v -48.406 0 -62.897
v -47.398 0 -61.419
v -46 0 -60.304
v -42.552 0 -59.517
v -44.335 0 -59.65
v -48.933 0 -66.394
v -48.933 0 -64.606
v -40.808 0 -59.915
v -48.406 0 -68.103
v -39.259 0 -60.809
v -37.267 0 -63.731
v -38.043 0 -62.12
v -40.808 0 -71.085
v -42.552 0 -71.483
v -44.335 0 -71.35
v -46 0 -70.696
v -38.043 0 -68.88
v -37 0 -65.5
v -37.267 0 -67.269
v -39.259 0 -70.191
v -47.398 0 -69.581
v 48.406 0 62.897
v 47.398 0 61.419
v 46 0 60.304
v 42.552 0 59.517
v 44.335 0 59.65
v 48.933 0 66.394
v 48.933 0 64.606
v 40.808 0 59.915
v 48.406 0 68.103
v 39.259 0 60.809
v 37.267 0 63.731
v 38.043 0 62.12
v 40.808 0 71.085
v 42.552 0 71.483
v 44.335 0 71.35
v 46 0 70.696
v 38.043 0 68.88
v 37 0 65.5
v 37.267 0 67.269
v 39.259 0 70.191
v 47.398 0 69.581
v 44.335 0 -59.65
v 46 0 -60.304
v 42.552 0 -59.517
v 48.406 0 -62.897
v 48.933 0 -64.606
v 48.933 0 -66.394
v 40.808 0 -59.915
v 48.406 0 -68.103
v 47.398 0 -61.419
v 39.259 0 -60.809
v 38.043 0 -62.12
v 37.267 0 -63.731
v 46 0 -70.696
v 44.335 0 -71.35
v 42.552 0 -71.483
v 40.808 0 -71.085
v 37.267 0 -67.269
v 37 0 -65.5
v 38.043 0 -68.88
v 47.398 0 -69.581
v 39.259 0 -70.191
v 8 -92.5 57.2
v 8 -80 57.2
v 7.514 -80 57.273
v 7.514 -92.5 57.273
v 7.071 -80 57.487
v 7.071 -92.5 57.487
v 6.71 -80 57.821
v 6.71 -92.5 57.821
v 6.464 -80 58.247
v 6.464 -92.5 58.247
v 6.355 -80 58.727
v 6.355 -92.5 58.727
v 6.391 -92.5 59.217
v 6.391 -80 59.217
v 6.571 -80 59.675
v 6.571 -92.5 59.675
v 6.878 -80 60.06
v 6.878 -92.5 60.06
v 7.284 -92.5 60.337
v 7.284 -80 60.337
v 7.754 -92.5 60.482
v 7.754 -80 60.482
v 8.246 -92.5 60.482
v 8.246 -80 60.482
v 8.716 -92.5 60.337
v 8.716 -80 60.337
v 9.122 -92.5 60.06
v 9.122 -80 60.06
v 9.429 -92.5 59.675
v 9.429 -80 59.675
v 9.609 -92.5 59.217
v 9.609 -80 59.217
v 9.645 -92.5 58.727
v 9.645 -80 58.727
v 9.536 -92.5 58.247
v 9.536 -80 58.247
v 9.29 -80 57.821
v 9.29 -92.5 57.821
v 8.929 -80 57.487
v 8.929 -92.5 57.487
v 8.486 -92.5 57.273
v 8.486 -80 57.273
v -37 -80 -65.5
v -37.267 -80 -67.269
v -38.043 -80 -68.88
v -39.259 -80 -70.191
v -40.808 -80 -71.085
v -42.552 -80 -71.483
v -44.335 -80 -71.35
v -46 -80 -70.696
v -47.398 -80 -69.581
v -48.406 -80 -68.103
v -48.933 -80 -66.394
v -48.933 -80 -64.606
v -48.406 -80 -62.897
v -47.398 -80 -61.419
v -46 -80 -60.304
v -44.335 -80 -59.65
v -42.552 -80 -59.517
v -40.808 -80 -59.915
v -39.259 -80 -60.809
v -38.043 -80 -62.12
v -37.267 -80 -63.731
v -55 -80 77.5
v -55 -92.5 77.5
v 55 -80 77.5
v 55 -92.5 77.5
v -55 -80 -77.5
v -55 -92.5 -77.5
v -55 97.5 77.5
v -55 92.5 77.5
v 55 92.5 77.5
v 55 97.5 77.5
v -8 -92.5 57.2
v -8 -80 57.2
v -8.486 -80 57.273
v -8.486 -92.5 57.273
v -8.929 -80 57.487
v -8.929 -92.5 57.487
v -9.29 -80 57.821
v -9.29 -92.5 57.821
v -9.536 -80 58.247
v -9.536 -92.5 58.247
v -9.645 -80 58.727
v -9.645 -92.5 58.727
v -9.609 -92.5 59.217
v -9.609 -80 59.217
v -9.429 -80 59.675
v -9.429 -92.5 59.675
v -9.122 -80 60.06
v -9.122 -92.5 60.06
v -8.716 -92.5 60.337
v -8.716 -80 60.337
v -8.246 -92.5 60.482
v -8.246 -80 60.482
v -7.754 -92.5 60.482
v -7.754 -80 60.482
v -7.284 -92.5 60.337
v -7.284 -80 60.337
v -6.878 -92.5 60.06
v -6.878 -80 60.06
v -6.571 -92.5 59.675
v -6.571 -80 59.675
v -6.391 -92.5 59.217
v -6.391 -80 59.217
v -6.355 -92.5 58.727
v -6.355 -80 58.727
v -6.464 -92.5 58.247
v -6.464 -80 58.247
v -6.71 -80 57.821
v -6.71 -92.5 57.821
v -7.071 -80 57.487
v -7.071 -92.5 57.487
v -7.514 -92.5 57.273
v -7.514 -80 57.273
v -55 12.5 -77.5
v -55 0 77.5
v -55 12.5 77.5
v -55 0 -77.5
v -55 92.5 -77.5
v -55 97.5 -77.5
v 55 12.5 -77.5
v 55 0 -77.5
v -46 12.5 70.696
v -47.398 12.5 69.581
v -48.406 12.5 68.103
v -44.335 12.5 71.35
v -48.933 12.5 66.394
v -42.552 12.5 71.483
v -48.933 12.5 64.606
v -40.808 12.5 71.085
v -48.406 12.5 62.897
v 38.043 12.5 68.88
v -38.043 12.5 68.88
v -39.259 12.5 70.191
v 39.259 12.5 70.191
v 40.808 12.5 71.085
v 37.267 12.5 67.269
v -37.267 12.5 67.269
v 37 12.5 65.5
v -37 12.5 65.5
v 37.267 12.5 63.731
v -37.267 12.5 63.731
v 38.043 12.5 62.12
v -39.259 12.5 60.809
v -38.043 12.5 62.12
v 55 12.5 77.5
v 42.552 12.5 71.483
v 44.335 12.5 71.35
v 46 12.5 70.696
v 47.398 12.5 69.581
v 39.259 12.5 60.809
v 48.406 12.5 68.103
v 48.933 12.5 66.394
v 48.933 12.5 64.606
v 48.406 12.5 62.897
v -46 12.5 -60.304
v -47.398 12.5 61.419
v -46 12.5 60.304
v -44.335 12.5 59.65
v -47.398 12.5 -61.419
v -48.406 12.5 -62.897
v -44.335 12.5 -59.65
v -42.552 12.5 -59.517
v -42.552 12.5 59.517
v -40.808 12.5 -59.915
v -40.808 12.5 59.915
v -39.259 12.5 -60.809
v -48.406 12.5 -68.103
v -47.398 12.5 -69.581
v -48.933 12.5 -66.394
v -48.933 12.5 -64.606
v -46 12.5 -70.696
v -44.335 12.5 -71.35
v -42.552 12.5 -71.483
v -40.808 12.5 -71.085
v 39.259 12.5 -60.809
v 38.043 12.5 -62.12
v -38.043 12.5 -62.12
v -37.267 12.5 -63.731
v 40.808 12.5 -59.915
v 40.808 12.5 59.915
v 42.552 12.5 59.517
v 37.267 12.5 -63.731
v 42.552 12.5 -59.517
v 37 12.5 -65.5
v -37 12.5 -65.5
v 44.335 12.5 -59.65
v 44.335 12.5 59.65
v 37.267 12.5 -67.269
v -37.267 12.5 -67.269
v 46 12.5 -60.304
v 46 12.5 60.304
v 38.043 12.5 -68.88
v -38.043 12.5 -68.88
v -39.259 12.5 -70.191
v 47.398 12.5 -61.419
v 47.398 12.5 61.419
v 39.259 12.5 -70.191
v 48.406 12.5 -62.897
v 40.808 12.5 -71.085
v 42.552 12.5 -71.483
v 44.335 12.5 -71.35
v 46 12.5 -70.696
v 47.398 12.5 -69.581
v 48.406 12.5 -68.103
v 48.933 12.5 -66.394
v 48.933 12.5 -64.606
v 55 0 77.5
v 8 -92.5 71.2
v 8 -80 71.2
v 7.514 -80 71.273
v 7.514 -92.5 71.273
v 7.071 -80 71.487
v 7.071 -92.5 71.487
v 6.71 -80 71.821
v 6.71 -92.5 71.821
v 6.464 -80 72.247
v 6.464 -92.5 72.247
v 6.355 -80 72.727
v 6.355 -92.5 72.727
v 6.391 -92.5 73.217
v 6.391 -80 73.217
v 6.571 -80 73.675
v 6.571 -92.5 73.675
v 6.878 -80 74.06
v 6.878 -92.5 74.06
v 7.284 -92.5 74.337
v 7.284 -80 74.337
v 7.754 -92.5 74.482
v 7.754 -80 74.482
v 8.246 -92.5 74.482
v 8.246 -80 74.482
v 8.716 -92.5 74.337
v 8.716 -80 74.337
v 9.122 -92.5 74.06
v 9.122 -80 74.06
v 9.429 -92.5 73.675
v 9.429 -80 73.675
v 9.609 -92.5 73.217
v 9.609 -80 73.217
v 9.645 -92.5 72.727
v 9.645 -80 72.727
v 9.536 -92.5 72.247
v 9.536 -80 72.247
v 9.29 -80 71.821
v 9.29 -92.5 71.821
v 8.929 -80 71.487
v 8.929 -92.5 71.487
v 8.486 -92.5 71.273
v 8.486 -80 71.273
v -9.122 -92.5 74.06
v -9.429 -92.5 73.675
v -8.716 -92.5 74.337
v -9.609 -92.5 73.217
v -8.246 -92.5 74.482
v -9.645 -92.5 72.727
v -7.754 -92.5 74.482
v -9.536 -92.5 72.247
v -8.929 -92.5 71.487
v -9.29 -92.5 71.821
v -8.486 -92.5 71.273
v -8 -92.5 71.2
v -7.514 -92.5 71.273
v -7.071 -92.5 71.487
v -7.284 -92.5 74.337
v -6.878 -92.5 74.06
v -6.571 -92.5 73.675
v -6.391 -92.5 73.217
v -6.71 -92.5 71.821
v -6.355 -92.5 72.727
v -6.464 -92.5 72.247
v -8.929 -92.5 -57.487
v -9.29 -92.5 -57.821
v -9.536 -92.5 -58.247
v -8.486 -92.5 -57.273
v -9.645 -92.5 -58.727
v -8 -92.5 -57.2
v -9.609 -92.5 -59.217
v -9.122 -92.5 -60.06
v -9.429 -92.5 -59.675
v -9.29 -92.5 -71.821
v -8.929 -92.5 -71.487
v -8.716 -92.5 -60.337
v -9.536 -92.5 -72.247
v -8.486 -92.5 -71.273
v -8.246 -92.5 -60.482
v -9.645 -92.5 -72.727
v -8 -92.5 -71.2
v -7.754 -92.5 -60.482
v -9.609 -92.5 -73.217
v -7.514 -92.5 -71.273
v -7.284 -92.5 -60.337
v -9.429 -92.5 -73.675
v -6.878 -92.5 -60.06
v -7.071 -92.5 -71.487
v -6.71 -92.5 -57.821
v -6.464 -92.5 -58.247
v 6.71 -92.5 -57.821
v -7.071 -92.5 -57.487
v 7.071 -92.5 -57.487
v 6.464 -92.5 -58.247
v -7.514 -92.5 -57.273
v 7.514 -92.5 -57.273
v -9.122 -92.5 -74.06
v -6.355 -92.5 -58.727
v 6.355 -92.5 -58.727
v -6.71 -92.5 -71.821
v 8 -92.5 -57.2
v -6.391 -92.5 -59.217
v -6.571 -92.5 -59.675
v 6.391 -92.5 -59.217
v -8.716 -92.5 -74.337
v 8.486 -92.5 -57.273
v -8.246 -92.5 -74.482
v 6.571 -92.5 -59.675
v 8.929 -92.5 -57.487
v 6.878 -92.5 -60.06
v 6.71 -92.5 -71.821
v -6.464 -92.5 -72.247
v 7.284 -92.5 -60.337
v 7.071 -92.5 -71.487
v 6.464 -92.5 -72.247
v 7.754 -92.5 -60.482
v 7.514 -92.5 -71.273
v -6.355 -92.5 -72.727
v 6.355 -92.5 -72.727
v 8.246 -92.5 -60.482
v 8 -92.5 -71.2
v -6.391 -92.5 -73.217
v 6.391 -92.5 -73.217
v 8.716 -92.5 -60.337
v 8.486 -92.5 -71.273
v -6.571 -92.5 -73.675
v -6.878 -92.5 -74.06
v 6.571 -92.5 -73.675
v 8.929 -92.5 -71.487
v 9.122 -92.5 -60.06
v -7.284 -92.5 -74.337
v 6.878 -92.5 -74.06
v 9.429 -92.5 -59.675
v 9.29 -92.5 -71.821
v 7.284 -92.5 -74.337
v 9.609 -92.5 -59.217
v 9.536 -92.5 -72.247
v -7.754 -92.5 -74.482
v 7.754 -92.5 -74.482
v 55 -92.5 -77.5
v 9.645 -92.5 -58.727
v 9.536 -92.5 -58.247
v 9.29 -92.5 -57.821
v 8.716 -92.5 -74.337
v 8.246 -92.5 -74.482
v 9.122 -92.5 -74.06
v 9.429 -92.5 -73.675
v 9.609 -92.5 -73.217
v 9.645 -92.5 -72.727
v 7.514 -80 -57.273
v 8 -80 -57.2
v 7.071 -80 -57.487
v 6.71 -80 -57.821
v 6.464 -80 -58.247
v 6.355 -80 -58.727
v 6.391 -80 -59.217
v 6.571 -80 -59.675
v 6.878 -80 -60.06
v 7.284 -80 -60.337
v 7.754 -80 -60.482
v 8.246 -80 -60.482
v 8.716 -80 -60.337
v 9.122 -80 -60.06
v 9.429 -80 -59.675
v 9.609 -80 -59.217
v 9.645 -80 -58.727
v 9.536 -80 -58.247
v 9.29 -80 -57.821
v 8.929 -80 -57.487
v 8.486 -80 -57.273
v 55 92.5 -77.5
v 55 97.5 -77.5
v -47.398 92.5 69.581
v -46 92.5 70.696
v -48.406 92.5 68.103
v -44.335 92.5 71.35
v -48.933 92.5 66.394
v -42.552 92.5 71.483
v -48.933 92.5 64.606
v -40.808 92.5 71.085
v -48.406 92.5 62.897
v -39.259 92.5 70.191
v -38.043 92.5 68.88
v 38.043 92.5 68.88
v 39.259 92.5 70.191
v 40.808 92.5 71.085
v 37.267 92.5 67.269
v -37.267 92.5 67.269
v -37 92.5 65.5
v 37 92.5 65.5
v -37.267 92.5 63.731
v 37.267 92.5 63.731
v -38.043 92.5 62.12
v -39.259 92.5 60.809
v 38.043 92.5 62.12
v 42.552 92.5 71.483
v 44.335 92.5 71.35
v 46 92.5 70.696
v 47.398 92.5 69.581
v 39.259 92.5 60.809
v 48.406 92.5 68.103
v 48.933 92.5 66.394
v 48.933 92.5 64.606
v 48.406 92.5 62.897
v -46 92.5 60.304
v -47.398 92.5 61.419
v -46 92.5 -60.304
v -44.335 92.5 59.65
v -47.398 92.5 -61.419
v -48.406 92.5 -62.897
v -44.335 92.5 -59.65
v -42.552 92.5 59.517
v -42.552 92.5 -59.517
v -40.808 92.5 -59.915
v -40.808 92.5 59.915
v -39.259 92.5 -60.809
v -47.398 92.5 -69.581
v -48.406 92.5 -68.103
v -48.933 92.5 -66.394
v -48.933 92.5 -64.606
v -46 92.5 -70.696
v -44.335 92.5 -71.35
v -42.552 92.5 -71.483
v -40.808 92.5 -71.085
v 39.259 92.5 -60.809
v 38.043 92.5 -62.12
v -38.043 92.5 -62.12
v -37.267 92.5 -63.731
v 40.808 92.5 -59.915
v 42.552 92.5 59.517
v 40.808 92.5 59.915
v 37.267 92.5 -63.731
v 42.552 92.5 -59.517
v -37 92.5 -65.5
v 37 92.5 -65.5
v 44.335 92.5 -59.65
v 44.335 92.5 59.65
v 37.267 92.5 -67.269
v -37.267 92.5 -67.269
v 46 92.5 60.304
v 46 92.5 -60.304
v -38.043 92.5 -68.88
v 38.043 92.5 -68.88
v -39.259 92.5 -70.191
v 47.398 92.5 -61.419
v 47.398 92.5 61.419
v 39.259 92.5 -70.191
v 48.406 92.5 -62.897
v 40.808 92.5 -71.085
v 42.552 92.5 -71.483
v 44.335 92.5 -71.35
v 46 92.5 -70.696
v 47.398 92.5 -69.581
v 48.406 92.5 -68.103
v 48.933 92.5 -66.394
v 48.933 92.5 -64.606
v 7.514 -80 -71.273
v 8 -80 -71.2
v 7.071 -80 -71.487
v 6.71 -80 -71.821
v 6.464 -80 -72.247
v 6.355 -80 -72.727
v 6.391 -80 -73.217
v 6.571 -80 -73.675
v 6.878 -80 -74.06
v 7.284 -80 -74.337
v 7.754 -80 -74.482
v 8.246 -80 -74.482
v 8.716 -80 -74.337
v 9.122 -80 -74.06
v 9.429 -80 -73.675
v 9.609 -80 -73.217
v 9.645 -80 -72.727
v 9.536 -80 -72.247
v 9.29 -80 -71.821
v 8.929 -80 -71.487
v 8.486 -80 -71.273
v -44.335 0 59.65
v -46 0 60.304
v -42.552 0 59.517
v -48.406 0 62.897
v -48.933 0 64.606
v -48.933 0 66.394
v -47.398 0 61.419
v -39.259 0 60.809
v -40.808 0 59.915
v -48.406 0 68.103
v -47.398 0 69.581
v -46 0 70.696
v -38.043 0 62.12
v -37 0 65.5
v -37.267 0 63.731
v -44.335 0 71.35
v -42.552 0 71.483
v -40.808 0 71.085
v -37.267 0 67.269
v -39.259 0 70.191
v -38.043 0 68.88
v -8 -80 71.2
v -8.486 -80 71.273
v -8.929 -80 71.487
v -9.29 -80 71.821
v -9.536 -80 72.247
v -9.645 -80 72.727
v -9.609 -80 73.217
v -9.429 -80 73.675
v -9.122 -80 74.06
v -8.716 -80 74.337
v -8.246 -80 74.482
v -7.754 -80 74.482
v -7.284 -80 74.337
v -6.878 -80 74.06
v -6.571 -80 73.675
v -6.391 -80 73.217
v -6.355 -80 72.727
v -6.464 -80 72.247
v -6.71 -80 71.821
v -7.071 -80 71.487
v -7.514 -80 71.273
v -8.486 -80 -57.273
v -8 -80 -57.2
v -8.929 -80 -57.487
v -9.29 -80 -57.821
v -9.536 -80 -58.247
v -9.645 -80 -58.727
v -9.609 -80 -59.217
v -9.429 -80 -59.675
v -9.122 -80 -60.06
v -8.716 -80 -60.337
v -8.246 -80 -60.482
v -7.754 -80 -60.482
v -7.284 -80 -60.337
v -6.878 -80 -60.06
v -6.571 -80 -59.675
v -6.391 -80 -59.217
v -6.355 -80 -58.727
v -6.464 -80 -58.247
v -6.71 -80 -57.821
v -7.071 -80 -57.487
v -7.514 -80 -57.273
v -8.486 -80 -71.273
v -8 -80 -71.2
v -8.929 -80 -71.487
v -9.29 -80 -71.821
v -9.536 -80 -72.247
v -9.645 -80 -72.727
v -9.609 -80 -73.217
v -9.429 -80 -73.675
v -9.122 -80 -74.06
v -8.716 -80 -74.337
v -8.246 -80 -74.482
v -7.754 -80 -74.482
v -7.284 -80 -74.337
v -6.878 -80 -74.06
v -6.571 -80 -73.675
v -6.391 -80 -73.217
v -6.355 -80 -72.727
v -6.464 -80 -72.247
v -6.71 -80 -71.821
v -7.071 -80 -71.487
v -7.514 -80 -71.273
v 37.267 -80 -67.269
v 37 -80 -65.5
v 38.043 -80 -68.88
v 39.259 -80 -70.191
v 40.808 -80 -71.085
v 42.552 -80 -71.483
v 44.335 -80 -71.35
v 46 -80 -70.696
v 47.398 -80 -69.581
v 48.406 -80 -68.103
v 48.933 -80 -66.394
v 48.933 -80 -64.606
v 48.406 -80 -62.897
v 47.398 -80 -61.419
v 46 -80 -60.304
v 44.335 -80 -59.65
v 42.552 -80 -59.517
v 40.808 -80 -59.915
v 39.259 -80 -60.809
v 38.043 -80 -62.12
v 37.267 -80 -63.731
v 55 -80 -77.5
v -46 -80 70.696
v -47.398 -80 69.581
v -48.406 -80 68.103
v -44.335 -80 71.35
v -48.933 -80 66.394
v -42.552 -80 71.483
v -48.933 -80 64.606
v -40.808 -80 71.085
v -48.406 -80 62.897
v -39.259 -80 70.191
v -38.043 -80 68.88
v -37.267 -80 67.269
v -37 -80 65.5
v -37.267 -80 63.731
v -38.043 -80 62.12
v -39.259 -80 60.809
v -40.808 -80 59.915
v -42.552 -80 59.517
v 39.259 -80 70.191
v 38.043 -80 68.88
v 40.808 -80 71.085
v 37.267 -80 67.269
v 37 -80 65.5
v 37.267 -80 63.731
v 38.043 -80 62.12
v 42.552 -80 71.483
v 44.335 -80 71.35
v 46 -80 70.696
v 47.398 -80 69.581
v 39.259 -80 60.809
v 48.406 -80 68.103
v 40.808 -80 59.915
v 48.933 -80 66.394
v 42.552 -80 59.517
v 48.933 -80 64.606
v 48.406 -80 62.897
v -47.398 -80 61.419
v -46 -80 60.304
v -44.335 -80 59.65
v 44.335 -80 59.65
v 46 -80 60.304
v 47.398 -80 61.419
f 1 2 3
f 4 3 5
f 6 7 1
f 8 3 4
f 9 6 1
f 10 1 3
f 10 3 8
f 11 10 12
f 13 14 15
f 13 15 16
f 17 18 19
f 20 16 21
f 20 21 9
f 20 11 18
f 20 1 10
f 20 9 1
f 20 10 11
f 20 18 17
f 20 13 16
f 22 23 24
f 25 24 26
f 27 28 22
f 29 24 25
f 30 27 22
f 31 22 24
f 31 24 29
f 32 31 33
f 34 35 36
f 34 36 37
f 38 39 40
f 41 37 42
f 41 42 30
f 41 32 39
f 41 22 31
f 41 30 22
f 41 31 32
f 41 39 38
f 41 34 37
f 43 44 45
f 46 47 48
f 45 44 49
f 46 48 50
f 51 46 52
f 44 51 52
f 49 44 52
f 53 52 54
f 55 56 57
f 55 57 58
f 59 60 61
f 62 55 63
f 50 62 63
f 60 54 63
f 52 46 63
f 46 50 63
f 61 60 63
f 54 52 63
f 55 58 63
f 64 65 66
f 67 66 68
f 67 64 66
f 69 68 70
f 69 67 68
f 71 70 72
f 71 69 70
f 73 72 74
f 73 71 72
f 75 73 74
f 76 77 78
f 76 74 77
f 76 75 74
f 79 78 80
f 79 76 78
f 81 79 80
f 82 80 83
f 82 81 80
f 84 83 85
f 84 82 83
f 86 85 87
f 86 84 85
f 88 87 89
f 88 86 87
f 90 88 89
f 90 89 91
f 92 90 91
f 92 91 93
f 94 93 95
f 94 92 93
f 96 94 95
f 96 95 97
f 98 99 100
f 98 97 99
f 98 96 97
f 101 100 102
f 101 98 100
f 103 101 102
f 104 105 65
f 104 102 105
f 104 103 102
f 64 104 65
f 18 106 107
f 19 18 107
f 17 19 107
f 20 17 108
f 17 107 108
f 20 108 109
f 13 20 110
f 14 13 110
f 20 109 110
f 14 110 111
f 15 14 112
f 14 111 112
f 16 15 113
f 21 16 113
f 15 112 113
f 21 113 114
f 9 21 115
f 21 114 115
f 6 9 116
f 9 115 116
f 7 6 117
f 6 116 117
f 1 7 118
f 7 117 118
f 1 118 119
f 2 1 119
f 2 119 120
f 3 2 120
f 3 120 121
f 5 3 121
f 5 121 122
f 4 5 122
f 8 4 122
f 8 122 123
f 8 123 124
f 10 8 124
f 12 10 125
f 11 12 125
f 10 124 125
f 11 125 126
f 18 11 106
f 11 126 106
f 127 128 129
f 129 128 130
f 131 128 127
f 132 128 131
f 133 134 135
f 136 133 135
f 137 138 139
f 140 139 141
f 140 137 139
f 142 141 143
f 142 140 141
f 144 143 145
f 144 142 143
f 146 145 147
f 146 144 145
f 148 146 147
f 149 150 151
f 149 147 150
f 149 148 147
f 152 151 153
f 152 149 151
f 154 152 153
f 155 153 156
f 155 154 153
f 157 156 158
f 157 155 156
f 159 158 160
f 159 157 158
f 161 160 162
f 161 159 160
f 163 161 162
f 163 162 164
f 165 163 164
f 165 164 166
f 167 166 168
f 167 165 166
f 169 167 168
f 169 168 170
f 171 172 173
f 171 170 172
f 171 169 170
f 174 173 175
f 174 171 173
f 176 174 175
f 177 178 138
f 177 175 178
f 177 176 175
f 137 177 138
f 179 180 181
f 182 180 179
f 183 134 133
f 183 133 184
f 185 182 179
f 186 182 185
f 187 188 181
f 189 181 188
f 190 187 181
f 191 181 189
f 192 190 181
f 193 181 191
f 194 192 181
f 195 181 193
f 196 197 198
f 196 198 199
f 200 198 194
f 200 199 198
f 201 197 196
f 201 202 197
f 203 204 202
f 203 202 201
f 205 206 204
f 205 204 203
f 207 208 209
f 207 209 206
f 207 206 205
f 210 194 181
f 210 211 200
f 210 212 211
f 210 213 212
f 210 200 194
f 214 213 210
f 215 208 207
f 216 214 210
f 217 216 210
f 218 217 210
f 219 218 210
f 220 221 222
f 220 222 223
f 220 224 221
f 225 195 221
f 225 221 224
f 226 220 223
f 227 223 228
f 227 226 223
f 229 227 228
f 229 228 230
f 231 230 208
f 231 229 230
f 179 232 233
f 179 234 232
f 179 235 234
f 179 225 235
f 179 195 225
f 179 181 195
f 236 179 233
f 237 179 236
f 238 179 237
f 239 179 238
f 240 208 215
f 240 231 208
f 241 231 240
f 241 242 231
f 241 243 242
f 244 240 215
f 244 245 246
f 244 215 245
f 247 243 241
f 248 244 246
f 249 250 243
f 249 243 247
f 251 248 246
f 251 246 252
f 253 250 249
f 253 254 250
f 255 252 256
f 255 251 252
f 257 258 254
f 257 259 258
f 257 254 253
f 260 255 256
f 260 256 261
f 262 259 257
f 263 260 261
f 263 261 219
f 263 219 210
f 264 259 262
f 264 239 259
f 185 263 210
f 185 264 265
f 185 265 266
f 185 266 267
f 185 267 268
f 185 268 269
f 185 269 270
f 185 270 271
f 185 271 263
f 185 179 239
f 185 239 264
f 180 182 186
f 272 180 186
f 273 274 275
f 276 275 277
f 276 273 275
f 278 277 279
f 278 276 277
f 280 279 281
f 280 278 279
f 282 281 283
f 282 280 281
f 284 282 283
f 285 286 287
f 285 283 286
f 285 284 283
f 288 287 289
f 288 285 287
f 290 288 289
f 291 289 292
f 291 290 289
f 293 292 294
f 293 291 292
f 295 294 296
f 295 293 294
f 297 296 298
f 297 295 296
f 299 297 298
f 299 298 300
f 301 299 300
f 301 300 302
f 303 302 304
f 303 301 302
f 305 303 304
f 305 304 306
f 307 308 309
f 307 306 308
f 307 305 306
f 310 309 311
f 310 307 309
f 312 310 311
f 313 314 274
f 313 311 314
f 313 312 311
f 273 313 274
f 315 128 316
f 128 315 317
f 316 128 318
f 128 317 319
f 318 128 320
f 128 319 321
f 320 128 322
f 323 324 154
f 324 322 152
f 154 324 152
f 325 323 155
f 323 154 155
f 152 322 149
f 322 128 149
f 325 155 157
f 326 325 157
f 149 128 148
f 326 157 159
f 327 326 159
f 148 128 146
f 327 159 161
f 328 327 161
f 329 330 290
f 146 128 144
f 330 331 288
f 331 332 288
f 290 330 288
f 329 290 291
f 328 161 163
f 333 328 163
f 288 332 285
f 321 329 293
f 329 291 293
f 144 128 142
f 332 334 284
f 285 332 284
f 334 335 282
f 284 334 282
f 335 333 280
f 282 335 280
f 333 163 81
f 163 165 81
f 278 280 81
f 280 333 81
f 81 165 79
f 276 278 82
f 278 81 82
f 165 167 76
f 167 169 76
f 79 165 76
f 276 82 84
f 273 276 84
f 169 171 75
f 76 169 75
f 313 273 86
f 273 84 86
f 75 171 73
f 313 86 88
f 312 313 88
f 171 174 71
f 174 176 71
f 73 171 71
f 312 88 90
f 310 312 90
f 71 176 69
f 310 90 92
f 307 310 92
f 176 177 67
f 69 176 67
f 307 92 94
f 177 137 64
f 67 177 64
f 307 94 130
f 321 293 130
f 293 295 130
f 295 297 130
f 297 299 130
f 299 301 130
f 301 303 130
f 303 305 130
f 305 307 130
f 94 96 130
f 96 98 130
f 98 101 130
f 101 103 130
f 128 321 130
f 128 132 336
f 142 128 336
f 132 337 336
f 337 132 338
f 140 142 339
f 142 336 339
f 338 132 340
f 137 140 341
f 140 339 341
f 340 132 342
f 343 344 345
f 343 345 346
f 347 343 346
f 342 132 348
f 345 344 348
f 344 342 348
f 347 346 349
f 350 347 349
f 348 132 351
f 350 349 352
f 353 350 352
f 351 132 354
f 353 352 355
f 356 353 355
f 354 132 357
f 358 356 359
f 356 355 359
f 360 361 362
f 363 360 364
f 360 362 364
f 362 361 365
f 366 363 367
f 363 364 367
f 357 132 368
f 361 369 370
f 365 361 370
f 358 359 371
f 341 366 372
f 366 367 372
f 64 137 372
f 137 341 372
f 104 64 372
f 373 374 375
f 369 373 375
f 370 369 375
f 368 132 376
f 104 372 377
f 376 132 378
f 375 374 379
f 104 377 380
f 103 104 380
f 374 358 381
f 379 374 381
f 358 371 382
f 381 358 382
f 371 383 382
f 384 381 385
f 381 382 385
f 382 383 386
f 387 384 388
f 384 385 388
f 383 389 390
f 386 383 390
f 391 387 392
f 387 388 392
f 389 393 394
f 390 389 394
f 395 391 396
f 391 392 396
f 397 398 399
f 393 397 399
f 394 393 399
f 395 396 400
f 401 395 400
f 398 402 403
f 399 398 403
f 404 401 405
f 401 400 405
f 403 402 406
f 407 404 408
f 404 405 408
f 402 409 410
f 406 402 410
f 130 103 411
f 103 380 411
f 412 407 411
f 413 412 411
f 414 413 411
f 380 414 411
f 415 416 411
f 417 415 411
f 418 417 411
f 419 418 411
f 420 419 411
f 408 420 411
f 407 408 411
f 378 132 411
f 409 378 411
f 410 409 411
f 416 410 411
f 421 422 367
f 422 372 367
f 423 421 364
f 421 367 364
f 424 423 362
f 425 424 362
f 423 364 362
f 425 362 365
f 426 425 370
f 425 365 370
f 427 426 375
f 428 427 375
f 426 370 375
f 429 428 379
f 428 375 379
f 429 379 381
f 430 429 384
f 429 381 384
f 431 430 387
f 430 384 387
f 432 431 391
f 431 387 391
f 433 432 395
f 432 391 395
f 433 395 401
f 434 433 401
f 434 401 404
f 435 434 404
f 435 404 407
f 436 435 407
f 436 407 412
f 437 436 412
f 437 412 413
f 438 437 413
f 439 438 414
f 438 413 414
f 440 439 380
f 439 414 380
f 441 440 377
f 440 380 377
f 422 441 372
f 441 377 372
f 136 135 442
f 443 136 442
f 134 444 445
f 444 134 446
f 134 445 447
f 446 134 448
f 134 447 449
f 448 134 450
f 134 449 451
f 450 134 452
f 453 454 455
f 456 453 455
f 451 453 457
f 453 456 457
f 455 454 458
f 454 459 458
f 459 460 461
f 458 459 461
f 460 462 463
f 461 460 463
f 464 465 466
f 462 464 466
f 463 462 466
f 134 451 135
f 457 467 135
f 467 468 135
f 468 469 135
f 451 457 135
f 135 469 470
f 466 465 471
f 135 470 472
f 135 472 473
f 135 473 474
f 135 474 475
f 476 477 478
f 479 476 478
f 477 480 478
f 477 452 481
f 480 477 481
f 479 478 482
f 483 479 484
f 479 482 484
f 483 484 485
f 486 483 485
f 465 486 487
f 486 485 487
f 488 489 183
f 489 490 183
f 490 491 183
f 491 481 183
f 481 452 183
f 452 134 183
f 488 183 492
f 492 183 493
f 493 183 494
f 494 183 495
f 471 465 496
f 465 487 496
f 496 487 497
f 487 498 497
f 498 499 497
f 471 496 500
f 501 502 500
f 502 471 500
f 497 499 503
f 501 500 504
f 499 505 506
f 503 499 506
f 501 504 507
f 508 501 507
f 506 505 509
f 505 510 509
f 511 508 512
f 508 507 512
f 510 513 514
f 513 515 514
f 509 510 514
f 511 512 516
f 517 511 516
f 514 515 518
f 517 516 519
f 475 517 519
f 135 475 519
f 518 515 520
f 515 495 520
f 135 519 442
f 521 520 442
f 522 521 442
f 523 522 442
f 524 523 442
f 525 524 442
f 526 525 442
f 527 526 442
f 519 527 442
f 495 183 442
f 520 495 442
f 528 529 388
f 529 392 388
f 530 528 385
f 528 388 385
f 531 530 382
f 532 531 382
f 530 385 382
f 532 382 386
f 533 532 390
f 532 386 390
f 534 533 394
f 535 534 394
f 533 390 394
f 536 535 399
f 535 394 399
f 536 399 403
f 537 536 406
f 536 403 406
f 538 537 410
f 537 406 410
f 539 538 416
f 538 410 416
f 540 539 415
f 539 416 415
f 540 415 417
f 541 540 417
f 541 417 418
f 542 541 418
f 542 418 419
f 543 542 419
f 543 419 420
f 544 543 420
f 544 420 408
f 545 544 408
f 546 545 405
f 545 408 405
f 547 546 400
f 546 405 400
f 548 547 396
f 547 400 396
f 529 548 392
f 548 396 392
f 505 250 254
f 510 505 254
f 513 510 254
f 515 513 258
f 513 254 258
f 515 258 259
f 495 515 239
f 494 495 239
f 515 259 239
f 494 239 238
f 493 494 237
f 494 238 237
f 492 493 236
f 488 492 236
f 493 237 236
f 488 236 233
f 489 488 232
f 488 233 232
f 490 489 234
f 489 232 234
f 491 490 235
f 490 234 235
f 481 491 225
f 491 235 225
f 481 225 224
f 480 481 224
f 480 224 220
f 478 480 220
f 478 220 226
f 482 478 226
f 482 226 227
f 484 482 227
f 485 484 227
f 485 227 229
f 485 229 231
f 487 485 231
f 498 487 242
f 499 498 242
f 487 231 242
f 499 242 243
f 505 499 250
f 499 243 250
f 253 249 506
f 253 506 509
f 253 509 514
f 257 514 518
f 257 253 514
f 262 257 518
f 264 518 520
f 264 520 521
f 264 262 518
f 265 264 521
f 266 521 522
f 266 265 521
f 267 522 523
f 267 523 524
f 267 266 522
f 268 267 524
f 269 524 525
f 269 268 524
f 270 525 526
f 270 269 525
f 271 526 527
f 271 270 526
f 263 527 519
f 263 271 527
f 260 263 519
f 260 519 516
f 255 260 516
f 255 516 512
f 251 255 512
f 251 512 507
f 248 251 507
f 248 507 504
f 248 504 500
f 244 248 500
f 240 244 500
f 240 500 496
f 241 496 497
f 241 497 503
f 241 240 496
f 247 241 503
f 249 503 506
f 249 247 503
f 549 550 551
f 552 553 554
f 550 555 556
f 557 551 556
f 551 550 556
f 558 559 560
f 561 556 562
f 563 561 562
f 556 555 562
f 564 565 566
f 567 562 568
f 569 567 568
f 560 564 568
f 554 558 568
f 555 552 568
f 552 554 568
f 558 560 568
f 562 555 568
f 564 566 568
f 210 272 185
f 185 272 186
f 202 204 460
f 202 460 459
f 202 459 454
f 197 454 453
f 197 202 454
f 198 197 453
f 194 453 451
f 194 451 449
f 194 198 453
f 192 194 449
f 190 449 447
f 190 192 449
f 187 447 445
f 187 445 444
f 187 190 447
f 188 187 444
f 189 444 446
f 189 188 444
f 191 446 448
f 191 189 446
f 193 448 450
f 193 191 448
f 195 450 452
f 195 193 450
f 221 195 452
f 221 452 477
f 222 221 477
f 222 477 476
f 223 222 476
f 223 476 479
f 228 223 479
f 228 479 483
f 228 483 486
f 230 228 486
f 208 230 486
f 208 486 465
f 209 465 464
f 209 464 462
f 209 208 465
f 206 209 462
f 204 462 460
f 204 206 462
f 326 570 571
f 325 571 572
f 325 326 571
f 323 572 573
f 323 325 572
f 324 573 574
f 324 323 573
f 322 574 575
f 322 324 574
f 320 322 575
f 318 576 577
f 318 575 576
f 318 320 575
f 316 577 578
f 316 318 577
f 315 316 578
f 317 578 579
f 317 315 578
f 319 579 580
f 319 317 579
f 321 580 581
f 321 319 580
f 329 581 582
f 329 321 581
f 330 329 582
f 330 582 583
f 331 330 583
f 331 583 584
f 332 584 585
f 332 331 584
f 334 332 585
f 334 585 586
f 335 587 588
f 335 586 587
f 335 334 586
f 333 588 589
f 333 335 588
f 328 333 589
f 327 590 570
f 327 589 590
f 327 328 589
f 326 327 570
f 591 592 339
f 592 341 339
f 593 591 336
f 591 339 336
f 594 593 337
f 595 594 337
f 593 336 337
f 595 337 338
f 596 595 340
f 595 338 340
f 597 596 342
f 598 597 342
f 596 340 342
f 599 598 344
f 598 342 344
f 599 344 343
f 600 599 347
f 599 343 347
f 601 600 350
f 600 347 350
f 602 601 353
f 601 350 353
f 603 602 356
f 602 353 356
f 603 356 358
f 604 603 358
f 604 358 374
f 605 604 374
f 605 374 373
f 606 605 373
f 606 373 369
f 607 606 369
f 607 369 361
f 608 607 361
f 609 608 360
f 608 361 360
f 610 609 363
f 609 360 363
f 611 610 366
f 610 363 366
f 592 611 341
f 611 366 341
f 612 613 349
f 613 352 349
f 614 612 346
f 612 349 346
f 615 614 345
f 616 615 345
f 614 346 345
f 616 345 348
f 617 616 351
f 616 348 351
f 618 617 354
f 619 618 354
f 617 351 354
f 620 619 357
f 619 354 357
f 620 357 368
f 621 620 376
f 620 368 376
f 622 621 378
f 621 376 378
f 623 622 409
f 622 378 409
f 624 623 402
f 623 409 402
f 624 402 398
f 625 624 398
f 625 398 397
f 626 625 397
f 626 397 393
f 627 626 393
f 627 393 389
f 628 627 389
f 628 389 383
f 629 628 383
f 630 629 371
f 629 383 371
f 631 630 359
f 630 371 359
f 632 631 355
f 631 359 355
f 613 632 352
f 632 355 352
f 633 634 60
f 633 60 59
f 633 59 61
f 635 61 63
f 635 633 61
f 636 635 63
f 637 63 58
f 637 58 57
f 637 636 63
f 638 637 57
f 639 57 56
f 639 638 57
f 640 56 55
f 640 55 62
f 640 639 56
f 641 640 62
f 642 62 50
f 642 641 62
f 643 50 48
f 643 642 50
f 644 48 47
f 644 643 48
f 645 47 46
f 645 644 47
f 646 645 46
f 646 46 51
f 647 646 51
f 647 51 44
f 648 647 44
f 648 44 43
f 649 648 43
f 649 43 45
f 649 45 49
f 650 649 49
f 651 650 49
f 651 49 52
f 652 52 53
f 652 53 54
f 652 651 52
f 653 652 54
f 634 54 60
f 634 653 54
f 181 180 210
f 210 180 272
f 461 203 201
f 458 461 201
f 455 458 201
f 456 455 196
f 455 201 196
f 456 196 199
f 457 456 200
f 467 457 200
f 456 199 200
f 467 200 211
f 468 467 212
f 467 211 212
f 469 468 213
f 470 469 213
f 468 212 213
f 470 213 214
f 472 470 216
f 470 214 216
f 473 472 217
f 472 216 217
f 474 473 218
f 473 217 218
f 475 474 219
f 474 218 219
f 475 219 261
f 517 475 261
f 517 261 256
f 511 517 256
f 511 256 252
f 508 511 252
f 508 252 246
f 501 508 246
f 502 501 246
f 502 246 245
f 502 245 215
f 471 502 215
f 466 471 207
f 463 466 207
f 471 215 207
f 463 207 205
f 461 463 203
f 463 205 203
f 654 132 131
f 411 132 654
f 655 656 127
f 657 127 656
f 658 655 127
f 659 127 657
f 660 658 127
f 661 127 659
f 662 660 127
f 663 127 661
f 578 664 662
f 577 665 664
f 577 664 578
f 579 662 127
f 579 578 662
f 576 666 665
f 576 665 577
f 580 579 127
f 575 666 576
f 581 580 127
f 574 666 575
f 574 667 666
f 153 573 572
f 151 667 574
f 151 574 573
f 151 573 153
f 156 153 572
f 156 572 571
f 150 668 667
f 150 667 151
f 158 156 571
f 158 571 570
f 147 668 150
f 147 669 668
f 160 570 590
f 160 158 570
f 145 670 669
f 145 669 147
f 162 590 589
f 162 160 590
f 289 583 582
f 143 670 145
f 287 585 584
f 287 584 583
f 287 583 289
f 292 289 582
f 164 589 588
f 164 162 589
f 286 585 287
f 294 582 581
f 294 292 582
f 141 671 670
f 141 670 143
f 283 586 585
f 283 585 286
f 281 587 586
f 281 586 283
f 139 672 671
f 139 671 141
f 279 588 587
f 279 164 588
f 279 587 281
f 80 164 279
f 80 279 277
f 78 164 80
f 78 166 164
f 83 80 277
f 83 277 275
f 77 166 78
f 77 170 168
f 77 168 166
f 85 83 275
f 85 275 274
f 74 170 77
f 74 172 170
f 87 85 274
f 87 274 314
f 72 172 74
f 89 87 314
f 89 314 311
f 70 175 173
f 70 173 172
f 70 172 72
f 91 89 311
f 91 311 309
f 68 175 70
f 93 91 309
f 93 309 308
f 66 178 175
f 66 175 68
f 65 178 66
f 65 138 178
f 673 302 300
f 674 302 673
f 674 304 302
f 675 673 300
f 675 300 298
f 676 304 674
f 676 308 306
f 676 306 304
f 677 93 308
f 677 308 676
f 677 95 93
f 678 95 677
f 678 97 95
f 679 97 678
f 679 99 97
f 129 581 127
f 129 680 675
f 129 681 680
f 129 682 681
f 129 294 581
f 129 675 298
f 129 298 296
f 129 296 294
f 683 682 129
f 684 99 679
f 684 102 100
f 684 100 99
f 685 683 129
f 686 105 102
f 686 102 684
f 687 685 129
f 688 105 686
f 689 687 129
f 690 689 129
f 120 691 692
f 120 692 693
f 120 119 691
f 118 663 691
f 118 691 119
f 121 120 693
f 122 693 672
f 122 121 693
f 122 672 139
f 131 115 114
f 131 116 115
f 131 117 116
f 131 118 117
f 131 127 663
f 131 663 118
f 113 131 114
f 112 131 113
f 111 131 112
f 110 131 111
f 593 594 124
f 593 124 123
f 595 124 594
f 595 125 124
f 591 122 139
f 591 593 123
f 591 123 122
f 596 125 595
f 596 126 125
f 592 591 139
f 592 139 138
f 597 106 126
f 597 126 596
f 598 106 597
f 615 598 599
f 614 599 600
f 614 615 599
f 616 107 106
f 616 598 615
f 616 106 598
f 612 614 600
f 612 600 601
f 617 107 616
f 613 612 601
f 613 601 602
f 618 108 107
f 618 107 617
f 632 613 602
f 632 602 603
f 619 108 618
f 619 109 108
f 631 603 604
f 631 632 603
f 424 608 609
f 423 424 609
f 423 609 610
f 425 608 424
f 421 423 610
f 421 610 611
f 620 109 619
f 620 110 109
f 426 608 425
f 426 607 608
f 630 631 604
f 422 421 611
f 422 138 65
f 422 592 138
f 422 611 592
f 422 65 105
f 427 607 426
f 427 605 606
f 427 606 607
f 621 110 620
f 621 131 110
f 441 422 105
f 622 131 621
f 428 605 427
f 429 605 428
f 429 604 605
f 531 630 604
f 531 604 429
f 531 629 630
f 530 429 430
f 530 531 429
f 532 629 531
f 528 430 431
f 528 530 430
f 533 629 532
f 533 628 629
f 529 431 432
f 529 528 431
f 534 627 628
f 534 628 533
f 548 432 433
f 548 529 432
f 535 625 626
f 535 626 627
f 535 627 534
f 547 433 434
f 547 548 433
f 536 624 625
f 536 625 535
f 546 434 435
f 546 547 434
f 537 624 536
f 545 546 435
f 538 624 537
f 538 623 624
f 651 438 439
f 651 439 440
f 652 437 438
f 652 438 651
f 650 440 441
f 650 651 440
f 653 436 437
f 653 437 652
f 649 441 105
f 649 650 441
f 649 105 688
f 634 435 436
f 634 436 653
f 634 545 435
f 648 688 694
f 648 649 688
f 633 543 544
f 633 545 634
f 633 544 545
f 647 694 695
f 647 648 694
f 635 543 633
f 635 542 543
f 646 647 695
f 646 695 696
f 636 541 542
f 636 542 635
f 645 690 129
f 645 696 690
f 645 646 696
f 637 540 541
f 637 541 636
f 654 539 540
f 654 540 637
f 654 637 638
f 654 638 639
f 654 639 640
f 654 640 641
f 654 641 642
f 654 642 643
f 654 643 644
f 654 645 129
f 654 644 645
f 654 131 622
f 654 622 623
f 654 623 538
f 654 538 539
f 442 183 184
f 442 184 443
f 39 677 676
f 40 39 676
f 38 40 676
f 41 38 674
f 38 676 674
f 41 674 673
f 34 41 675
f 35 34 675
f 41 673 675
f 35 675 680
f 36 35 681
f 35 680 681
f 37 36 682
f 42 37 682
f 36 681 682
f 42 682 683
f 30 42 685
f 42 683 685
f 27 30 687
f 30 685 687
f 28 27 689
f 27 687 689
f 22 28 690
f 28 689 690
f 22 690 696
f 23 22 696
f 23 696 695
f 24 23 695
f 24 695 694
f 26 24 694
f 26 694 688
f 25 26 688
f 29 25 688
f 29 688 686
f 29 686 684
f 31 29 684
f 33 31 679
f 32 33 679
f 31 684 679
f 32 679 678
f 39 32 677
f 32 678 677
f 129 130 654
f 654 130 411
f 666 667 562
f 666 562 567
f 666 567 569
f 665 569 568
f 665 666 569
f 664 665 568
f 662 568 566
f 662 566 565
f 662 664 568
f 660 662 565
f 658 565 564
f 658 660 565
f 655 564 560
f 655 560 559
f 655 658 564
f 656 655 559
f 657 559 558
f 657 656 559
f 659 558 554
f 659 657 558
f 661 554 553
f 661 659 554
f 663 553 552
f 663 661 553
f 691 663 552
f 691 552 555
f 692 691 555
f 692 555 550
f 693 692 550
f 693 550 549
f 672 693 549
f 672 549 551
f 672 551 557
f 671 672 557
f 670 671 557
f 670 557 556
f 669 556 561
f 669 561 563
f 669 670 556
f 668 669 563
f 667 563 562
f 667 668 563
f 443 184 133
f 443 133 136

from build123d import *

# Parameters (mm, degrees)
SKETCH1_W                           = 110
SKETCH1_H                           = 155
BOSS_EXTRUDE1_DEPTH                 = 12.5
SKETCH2_R                           = 6
BOSS_EXTRUDE2_DEPTH                 = 80
MIRROR2_COPY_1_SKETCH_R             = 6
MIRROR2_COPY_1_DEPTH                = 80
LPATTERN1_COUNT                     = 2
LPATTERN1_PITCH                     = 92.5
F_3_3_3_3_DIAMETER_HOLE1_AT_2_COUNT = 2
F_3_3_3_3_DIAMETER_HOLE1_AT_2_PITCH = 16
LPATTERN3_COUNT                     = 2
LPATTERN3_PITCH                     = 14
SKETCH7_W                           = 110
SKETCH7_H                           = 155
BOSS_EXTRUDE3_DEPTH                 = 5


with BuildPart() as part:
    # Sketch1 → Boss-Extrude1 (new body)
    with BuildSketch(Plane(origin=(0, 0, 0), x_dir=(1, 0, 0), z_dir=(0, 1, 0))):
        Rectangle(SKETCH1_W, SKETCH1_H)
    extrude(amount=BOSS_EXTRUDE1_DEPTH)

    # Sketch2 → Boss-Extrude2 (add)
    with BuildSketch(Plane(origin=(0, 12.5, 0), x_dir=(1, 0, 0), z_dir=(0, 1, 0))):
        with Locations((-43, 65.5)):
            Circle(SKETCH2_R)
    boss_extrude2 = extrude(amount=BOSS_EXTRUDE2_DEPTH)

    # Mirror1: Boss-Extrude2 across plane
    add(boss_extrude2.mirror(Plane.XY))

    # Mirror2: Boss-Extrude2 across plane
    add(boss_extrude2.mirror(Plane(origin=(0, 0, 0), x_dir=(0, 0, 1), z_dir=(1, 0, 0))))

    # Mirror2 copy 1 sketch → Mirror2 copy 1 (add)
    with BuildSketch(Plane(origin=(0, 12.5, 0), x_dir=(-1, 0, 0), z_dir=(0, 1, 0))):
        with Locations((-43, 65.5)):
            Circle(MIRROR2_COPY_1_SKETCH_R)
    extrude(amount=MIRROR2_COPY_1_DEPTH)


with BuildPart() as lpattern1_1:
    # LPattern1: pattern copy
    add(part.part.moved(Location(Vector(0, -1, 0) * (1 * LPATTERN1_PITCH))))

    # Sketch6 → Ø3.3 (3.3) Diameter Hole1 (revolve, cut)
    with BuildSketch(Plane(origin=(8, -92.5, 72.85), x_dir=(0, 0, -1), z_dir=(1, 0, 0))):
        Polygon((0, 0), (0, 20.991420021), (1.65, 20), (1.65, 0), align=None)
    f_3_3_3_3_diameter_hole1 = revolve(axis=Axis((8, -98.85, 72.85), (0, 1, 0)), mode=Mode.SUBTRACT)

    # Ø3.3 (3.3) Diameter Hole1 at 2: Ø3.3 (3.3) Diameter Hole1 ×2
    with Locations(*[(-i * F_3_3_3_3_DIAMETER_HOLE1_AT_2_PITCH, 0, 0) for i in range(1, F_3_3_3_3_DIAMETER_HOLE1_AT_2_COUNT)]):
        add(f_3_3_3_3_diameter_hole1, mode=Mode.SUBTRACT)

    # LPattern3: Ø3.3 (3.3) Diameter Hole1 ×2
    with Locations(*[(0, 0, -i * LPATTERN3_PITCH) for i in range(1, LPATTERN3_COUNT)]):
        add(f_3_3_3_3_diameter_hole1, mode=Mode.SUBTRACT)

    # LPattern3 copy 1 sketch → LPattern3 copy 1 (revolve, cut)
    with BuildSketch(Plane(origin=(-8, -92.5, 58.85), x_dir=(0, 0, -1), z_dir=(1, 0, 0))):
        Polygon((0, 0), (0, 20.991420021), (1.65, 20), (1.65, 0), align=None)
    revolve(axis=Axis((-8, -98.85, 58.85), (0, 1, 0)), mode=Mode.SUBTRACT)

    # Mirror3: Ø3.3 (3.3) Diameter Hole1 across plane
    add(f_3_3_3_3_diameter_hole1.mirror(Plane.XY), mode=Mode.SUBTRACT)

    # Mirror3 copy 1 sketch → Mirror3 copy 1 (revolve, cut)
    with BuildSketch(Plane(origin=(8, -92.5, -58.85), x_dir=(0, 0, 1), z_dir=(1, 0, 0))):
        Polygon((0, 0), (0, -20.991420021), (1.65, -20), (1.65, 0), align=None)
    revolve(axis=Axis((8, -98.85, -58.85), (0, -1, 0)), mode=Mode.SUBTRACT)

    # Mirror3 copy 2 sketch → Mirror3 copy 2 (revolve, cut)
    with BuildSketch(Plane(origin=(-8, -92.5, -58.85), x_dir=(0, 0, 1), z_dir=(1, 0, 0))):
        Polygon((0, 0), (0, -20.991420021), (1.65, -20), (1.65, 0), align=None)
    revolve(axis=Axis((-8, -98.85, -58.85), (0, -1, 0)), mode=Mode.SUBTRACT)

    # Mirror3 copy 3 sketch → Mirror3 copy 3 (revolve, cut)
    with BuildSketch(Plane(origin=(-8, -92.5, -72.85), x_dir=(0, 0, 1), z_dir=(1, 0, 0))):
        Polygon((0, 0), (0, -20.991420021), (1.65, -20), (1.65, 0), align=None)
    revolve(axis=Axis((-8, -98.85, -72.85), (0, -1, 0)), mode=Mode.SUBTRACT)


with BuildPart() as part_1:
    add(part.part)

    # Sketch7 → Boss-Extrude3 (add)
    with BuildSketch(Plane(origin=(0, 92.5, 0), x_dir=(1, 0, 0), z_dir=(0, 1, 0))):
        Rectangle(SKETCH7_W, SKETCH7_H)
    extrude(amount=BOSS_EXTRUDE3_DEPTH)


solid = Compound([lpattern1_1.part, part_1.part])
